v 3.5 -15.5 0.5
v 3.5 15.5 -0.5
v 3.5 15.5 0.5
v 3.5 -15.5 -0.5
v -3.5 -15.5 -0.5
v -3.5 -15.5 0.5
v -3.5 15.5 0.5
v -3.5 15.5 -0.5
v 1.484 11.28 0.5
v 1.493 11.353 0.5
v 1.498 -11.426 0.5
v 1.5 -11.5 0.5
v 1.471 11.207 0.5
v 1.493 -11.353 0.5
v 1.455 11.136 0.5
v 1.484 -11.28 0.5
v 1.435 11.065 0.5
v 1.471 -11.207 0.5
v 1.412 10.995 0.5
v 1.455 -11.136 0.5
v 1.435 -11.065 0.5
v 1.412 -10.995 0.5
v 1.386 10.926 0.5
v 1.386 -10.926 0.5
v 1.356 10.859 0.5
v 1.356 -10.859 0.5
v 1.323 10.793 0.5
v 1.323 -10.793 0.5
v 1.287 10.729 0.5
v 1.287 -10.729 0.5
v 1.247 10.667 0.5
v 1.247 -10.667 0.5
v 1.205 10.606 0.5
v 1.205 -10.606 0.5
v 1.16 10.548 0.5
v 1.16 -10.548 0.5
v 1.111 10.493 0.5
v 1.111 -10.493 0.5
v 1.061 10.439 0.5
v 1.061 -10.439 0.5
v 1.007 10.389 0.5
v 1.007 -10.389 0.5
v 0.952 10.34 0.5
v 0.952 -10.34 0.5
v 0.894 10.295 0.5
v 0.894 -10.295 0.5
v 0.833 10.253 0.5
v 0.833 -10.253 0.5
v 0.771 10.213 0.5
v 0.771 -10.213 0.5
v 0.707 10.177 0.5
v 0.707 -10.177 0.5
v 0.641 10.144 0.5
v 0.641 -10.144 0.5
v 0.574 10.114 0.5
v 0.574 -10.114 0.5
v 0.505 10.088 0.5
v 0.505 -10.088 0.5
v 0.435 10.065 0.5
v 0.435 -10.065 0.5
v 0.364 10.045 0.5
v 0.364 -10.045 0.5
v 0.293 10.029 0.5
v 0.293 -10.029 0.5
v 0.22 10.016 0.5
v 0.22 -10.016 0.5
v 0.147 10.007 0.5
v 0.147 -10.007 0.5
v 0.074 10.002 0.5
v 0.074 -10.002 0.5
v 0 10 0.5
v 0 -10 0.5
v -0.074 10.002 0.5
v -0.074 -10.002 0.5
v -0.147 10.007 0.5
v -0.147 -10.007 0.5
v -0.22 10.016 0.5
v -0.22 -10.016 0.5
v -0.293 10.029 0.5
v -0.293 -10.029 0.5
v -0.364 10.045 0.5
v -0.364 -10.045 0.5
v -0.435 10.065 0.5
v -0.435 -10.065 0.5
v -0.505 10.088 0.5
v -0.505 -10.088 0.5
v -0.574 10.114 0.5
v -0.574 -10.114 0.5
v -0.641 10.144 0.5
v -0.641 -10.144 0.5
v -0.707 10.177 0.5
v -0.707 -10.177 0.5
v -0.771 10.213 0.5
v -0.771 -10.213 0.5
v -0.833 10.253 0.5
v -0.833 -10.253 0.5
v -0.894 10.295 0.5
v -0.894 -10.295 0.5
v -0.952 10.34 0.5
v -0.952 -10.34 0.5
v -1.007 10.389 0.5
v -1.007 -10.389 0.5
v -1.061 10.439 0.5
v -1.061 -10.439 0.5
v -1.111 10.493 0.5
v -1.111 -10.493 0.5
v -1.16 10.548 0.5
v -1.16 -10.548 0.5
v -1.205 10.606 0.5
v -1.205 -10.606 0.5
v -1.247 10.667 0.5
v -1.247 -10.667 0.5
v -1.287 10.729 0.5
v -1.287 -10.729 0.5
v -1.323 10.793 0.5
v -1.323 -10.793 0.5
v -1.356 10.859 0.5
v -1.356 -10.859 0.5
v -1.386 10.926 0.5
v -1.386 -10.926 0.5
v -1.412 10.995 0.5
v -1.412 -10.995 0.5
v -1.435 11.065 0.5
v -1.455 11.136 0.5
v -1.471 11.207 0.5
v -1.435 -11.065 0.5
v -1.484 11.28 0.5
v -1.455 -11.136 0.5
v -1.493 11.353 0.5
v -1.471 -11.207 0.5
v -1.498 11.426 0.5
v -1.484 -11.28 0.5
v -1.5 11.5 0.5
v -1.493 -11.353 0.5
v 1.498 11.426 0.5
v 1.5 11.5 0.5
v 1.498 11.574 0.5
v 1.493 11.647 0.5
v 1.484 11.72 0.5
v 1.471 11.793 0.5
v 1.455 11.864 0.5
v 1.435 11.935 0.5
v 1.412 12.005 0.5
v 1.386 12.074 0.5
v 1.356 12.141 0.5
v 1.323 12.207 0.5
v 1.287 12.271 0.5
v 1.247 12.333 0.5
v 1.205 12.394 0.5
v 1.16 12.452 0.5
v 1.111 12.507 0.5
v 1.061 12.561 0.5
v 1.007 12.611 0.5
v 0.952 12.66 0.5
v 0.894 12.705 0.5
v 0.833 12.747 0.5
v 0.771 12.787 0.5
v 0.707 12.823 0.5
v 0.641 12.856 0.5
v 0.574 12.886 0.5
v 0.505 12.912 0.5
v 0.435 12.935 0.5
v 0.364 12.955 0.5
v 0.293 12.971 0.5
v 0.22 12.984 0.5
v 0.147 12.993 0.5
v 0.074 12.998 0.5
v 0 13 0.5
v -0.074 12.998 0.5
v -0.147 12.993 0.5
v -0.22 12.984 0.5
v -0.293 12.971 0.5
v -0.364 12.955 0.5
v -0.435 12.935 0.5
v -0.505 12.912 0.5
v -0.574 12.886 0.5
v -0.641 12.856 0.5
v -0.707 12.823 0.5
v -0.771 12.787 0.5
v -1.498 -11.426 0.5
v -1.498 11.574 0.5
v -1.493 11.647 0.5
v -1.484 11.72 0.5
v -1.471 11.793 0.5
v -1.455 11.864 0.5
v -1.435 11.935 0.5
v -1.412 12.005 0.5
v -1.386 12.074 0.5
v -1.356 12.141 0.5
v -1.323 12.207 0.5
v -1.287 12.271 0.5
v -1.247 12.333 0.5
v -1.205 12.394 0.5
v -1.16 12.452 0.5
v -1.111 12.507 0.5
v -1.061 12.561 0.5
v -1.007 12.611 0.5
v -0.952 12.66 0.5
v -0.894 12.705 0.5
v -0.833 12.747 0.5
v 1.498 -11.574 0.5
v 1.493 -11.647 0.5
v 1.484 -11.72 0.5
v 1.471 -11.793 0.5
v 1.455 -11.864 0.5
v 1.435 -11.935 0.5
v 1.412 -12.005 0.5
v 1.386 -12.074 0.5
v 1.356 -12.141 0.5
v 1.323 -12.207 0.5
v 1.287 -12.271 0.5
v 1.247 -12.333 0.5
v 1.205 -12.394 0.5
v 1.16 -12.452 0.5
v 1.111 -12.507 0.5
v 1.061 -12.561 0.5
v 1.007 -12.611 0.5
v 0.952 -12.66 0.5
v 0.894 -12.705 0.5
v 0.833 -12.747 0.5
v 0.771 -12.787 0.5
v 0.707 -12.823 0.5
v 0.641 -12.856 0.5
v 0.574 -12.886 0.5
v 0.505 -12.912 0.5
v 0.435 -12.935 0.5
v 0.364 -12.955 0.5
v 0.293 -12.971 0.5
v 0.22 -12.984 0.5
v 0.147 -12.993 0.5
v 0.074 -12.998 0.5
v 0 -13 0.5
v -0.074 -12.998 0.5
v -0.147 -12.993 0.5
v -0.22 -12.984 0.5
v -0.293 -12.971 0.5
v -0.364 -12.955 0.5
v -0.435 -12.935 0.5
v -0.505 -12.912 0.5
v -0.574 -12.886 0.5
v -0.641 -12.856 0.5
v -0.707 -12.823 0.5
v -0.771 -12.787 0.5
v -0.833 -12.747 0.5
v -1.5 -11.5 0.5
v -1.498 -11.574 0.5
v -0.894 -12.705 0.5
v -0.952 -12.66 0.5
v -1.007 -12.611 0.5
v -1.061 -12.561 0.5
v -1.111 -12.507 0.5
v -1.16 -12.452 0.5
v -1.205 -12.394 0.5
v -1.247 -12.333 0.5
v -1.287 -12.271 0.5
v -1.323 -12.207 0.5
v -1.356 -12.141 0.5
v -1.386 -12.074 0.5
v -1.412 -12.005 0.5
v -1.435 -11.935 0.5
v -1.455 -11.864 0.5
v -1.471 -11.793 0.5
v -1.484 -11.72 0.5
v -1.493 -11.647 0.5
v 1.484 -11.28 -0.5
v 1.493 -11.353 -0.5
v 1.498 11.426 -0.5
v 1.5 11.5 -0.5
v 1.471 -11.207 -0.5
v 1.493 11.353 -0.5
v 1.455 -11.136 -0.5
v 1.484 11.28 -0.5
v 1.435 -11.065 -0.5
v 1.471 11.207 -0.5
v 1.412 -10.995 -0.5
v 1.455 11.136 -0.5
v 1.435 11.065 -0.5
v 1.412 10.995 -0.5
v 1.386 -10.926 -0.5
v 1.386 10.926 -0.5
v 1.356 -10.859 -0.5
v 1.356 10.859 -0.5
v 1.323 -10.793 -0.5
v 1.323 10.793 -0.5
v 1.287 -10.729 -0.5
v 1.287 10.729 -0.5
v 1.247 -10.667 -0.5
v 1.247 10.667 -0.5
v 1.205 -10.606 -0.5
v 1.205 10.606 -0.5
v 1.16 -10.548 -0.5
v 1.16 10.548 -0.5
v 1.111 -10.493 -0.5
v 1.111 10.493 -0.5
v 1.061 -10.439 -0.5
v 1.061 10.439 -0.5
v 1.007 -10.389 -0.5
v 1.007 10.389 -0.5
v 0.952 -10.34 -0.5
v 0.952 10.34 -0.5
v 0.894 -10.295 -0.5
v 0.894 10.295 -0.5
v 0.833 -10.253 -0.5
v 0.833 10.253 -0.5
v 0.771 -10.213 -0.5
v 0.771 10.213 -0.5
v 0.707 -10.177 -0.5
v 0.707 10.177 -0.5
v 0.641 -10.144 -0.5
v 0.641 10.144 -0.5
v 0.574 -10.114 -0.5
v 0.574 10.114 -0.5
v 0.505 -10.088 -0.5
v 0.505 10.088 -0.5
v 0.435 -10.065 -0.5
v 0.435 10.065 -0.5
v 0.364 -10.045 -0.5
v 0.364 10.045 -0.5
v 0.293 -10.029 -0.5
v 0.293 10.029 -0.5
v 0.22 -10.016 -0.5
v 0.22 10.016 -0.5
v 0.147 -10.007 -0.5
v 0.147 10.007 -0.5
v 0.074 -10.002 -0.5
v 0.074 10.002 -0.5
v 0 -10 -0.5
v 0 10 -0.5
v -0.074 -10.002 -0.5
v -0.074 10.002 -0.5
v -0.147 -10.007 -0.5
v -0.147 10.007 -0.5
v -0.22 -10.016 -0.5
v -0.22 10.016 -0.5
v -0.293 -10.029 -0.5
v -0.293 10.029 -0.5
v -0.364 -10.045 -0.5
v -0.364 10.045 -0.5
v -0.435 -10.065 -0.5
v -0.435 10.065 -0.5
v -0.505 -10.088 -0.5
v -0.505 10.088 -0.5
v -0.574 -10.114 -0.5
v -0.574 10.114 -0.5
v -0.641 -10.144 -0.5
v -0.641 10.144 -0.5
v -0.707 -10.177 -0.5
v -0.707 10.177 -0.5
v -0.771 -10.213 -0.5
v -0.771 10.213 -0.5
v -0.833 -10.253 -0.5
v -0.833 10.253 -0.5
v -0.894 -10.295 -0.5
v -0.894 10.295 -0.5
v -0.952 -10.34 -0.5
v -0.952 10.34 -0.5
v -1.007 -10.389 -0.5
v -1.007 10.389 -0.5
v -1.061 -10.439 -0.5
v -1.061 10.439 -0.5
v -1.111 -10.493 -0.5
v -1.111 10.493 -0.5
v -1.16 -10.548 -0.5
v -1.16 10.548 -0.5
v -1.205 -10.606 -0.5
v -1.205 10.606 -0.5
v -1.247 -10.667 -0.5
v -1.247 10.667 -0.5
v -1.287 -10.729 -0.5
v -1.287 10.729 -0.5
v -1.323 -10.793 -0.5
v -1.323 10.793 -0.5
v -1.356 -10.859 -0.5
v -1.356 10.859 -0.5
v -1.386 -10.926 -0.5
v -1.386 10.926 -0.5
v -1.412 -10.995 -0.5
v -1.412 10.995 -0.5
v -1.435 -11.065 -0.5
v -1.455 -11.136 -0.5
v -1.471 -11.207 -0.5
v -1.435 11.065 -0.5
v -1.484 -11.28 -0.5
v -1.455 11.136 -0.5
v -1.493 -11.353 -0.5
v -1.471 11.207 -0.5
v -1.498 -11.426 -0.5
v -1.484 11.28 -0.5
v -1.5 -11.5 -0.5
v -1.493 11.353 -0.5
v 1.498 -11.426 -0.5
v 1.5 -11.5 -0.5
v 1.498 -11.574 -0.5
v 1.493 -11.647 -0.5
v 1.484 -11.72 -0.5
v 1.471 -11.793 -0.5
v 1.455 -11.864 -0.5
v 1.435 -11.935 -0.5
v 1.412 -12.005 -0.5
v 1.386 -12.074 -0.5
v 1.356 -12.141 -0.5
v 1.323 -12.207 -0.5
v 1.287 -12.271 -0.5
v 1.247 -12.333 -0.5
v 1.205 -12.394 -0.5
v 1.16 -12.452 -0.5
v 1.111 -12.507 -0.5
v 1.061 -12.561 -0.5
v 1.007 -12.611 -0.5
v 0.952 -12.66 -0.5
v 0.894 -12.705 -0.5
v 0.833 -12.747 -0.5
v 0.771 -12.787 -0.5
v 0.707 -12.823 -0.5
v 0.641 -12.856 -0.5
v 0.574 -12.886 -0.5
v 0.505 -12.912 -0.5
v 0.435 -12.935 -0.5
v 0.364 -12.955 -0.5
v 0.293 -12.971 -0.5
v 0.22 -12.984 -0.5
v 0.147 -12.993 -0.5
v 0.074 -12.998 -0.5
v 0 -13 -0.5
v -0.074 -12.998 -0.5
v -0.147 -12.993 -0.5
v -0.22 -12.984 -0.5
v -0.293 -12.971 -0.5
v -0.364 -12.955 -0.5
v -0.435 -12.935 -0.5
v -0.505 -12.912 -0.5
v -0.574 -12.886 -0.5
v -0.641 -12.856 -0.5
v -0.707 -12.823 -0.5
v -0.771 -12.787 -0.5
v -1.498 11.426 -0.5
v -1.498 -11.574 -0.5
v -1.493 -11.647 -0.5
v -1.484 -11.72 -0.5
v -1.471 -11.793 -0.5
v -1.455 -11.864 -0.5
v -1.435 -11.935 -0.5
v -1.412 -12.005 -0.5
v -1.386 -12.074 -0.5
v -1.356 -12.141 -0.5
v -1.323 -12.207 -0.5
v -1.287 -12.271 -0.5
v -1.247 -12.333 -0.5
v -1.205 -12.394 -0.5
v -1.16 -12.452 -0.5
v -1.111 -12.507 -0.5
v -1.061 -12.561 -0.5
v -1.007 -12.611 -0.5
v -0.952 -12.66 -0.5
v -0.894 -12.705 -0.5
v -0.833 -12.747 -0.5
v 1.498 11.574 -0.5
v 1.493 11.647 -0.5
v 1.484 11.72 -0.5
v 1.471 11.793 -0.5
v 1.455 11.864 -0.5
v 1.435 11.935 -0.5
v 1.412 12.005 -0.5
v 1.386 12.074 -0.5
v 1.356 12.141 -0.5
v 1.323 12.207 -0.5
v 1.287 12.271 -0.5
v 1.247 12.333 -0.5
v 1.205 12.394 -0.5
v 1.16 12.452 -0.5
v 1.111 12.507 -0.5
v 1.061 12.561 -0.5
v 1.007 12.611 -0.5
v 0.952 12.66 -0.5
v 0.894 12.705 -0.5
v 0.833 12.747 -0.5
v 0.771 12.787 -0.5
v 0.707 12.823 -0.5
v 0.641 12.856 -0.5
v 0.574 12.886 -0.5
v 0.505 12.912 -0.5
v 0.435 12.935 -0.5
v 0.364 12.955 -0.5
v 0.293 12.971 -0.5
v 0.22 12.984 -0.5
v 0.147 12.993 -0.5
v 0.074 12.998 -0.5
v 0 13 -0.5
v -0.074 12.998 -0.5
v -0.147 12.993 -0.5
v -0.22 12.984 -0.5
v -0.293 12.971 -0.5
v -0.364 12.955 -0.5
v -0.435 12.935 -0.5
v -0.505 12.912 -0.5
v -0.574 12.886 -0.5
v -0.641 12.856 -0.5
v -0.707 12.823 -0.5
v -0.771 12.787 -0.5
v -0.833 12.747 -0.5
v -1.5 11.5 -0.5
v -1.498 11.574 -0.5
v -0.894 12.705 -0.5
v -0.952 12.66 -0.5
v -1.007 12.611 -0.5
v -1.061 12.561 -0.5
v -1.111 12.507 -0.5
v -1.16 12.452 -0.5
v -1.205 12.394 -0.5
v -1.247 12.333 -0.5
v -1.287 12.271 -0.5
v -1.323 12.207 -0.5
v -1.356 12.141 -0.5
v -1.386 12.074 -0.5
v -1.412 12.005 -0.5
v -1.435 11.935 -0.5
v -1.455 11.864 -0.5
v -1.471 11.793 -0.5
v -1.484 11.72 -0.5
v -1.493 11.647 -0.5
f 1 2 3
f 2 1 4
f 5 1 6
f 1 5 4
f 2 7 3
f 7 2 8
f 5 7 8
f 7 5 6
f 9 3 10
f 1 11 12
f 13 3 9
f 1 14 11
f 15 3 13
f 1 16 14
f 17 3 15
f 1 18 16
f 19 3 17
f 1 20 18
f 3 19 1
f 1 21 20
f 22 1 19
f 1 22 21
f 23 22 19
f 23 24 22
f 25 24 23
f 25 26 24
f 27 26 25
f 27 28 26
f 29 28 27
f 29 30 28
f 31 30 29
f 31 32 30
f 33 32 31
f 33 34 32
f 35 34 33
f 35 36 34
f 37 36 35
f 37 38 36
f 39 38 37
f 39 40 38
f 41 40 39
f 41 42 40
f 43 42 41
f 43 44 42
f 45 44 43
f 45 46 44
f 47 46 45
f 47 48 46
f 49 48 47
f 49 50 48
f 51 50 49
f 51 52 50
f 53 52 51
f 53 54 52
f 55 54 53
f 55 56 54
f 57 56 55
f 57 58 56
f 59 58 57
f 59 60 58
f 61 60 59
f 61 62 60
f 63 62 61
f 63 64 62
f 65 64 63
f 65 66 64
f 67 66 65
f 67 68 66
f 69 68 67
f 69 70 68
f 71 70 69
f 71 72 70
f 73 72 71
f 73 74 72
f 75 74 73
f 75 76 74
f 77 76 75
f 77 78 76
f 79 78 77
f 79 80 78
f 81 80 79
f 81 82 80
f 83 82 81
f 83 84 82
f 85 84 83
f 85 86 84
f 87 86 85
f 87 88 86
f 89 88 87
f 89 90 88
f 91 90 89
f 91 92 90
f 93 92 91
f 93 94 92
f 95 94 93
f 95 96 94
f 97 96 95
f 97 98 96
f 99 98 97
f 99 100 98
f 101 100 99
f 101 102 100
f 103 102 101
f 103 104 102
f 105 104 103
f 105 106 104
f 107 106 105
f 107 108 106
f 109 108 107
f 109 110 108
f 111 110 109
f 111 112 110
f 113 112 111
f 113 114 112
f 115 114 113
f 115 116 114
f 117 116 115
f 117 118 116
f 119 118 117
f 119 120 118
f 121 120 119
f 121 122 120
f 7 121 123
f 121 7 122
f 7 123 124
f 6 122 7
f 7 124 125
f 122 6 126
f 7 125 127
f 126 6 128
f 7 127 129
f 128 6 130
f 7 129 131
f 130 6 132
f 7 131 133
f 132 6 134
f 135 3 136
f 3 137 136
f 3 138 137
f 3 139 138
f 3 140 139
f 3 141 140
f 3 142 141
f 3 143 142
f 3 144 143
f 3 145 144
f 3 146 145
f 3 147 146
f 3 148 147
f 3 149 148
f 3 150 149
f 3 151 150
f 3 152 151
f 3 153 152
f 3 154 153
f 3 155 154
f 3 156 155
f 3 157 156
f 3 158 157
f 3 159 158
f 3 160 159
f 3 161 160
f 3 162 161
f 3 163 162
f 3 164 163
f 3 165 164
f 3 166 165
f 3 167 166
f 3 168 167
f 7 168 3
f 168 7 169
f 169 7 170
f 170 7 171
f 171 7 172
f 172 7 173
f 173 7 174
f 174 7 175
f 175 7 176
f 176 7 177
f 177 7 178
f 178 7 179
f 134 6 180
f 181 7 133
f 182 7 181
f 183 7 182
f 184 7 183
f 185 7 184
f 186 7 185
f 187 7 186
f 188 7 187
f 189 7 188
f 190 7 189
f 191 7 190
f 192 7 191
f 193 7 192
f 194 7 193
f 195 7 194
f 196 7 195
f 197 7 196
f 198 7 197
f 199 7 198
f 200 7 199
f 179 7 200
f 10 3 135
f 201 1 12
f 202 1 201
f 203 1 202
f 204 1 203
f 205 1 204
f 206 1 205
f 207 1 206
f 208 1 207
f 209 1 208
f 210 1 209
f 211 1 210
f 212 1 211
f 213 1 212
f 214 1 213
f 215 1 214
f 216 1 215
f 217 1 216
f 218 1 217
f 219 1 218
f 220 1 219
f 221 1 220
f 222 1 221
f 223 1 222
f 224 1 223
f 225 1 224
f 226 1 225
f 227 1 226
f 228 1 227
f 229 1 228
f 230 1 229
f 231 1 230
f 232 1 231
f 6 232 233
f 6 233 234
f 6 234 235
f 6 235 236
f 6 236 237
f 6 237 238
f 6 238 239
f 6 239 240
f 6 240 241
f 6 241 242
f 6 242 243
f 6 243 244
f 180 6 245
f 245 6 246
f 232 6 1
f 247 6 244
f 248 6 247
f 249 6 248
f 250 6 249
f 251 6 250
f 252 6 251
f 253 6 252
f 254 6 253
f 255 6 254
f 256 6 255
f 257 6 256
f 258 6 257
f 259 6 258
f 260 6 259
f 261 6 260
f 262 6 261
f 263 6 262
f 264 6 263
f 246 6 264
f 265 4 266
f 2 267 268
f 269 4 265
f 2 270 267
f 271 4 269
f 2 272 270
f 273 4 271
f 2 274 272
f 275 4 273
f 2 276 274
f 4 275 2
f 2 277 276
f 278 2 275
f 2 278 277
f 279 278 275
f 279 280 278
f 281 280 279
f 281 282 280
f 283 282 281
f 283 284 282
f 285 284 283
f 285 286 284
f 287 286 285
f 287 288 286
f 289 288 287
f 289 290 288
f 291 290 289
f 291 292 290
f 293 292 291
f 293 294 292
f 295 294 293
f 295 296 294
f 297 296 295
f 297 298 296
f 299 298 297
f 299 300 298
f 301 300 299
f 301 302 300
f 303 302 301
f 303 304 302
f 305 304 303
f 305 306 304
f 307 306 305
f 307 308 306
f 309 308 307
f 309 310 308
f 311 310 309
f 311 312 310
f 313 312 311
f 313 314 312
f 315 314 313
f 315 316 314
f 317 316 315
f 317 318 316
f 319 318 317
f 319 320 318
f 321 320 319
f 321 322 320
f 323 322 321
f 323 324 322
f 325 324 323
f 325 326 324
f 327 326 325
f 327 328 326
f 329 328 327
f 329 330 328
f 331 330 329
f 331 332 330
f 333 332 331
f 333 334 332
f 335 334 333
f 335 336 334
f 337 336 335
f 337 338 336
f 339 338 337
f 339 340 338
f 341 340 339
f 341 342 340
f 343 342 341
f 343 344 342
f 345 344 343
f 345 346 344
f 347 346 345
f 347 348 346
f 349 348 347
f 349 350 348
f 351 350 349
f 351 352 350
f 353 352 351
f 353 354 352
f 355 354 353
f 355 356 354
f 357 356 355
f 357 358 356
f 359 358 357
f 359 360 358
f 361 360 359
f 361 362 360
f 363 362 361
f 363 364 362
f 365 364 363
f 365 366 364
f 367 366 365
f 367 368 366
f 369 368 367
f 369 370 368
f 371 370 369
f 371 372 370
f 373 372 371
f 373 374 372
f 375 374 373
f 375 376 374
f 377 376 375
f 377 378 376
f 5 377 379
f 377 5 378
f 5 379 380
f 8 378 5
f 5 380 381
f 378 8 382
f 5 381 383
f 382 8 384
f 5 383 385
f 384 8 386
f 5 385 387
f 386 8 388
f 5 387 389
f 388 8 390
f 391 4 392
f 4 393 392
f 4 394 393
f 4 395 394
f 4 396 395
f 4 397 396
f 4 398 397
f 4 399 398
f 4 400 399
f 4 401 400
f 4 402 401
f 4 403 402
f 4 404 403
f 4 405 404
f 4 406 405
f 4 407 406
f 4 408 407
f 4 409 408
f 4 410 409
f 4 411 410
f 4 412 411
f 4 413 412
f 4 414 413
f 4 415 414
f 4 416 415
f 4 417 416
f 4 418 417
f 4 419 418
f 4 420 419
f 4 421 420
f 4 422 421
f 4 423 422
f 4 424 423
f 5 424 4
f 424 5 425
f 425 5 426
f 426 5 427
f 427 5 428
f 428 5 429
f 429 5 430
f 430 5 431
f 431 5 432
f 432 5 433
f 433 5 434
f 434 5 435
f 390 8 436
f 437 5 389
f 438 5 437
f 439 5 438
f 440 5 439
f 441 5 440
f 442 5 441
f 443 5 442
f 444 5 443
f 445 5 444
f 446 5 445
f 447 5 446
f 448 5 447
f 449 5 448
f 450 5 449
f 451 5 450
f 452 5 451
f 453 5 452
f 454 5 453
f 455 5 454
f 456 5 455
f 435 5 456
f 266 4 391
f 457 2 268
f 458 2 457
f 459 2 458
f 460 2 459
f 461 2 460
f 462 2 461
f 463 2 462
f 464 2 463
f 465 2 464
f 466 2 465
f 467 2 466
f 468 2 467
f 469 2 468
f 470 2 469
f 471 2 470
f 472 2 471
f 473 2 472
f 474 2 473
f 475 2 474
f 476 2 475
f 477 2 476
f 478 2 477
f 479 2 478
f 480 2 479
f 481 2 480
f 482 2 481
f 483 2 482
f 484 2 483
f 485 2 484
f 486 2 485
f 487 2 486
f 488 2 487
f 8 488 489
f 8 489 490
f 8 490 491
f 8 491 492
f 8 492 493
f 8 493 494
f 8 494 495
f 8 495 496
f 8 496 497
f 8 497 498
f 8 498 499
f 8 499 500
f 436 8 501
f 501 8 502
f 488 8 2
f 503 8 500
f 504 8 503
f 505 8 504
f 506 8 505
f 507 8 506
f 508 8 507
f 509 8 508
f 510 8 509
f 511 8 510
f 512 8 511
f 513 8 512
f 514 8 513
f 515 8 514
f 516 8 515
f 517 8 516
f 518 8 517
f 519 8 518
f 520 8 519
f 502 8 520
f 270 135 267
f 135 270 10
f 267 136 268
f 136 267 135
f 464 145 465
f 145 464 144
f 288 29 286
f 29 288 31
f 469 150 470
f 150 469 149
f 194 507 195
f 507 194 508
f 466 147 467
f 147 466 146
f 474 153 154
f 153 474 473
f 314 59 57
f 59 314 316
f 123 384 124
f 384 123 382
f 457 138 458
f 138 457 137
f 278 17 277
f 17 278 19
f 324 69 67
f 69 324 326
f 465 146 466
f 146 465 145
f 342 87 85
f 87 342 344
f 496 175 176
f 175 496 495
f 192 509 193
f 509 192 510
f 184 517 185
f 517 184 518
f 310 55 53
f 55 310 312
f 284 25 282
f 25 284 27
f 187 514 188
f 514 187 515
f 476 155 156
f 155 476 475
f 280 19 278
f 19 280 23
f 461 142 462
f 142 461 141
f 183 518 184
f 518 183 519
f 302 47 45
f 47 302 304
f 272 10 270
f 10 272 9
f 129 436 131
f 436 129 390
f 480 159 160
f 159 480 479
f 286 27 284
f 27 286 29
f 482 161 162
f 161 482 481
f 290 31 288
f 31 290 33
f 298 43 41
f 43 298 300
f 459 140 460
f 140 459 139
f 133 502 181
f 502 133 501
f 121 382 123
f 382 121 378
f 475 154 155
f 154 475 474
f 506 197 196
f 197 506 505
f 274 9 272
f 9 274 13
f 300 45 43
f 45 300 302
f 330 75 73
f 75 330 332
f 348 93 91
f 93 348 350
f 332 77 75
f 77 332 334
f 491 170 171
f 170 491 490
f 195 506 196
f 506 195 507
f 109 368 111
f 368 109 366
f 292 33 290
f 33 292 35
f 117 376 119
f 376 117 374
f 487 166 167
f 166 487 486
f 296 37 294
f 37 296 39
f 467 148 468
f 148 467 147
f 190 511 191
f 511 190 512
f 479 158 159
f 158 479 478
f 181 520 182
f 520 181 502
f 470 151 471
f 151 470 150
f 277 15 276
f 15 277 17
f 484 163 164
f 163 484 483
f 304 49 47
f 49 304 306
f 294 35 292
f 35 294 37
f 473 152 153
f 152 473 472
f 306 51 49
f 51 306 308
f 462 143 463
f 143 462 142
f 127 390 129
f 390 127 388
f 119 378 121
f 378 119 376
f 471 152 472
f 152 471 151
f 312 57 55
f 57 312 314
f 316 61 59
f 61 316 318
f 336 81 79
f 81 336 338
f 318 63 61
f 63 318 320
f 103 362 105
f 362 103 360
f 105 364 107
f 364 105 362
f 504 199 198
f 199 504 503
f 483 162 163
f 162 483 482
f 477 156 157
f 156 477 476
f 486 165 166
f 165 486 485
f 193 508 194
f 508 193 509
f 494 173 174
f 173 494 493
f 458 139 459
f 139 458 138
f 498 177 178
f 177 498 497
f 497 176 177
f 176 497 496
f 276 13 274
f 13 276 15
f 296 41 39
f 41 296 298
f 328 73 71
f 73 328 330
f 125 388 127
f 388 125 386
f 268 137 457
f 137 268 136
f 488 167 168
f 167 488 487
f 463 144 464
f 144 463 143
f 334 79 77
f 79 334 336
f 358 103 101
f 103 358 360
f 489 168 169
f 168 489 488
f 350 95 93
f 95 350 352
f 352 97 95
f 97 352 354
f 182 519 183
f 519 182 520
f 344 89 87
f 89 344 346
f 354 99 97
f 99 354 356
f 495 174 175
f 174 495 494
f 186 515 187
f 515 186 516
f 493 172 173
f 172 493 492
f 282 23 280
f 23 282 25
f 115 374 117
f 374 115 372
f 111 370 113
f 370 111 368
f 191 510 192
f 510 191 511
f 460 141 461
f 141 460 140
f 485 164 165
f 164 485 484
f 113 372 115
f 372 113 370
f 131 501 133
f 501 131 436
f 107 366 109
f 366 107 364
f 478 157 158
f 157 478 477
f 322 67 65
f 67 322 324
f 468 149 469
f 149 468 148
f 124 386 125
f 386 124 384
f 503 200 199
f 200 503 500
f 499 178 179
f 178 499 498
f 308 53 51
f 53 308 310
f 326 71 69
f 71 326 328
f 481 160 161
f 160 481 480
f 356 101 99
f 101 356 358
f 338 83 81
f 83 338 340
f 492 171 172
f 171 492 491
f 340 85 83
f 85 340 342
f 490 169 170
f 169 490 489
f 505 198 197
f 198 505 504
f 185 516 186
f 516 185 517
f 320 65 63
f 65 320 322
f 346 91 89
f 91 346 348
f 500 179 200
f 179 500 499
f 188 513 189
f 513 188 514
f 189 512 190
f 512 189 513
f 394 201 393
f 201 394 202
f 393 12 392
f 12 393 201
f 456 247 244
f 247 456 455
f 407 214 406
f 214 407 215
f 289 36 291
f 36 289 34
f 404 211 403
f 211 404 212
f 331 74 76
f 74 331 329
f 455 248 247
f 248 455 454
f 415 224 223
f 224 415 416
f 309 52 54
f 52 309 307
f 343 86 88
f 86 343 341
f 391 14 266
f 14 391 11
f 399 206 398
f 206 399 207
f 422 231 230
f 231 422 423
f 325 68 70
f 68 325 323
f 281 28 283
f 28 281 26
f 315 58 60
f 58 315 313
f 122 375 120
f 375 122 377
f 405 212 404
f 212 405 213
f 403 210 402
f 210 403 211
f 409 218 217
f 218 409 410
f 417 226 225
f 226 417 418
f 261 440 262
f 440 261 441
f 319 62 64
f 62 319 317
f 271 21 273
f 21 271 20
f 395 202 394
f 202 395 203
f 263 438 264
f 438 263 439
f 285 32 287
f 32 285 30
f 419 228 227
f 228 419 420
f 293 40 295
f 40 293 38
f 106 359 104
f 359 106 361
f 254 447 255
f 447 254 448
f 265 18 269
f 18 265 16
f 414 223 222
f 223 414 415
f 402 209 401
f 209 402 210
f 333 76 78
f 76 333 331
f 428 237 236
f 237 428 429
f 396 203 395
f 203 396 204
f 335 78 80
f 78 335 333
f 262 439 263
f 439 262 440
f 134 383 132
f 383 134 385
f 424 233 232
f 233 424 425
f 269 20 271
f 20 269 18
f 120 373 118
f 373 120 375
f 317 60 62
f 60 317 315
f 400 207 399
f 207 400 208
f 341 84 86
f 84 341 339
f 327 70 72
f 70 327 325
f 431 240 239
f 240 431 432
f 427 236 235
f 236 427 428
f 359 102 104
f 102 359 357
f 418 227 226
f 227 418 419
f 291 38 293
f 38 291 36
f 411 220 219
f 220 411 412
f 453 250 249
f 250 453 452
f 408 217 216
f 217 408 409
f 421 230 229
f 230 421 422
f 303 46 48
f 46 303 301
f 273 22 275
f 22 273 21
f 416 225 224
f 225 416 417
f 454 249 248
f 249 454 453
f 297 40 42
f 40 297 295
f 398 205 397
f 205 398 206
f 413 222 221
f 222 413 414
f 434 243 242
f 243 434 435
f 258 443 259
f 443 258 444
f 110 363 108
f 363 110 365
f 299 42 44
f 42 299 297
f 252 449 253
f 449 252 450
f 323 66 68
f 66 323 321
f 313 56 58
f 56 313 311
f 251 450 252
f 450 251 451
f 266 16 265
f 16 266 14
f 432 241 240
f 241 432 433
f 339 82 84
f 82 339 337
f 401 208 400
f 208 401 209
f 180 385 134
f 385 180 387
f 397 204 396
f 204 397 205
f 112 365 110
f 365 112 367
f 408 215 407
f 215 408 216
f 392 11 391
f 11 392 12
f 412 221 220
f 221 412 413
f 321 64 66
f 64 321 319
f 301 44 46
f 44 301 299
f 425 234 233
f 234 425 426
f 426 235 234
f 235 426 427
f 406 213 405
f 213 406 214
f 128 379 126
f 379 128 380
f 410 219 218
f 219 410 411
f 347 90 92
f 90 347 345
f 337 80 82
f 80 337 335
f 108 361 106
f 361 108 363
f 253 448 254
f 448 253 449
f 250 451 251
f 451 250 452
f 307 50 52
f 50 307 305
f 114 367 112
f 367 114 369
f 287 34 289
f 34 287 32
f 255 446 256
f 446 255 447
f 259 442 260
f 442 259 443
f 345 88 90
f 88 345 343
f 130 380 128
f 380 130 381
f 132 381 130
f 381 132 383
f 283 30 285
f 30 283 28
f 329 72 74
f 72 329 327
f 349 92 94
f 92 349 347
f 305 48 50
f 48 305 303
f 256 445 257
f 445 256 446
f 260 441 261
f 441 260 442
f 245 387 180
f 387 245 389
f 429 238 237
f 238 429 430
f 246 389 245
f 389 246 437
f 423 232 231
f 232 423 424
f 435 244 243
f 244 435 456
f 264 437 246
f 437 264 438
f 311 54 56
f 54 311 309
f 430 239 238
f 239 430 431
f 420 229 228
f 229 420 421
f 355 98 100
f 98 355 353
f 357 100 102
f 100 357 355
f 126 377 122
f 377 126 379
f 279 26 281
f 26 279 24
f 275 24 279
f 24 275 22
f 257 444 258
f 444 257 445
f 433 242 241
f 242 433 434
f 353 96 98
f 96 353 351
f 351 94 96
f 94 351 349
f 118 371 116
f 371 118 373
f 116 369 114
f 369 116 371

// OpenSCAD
// 29.24 from hole to hole
height = 1;
width = 5;
inter_hole_dist = 23;
margin = 4;
length = inter_hole_dist + margin * 2;

hole_radius = 3.0/2;
fn = 128;

module render()
{
  rotate(a=90, v=[1,0,0])
  difference() {
    cube(size = [width+2, height, length], center = true);

    translate([0, 0, -length/2 + margin])
    rotate(a=90, v=[1,0,0])
    cylinder(h=width+2,
             r1=hole_radius,
             r2=hole_radius, $fn=fn, center = true);

    translate([0, 0, length/2 - margin])
    rotate(a=90, v=[1,0,0])
    cylinder(h=width+2,
             r1=hole_radius,
             r2=hole_radius, $fn=fn, center = true);
  }
}

echo(version=version());

render();
